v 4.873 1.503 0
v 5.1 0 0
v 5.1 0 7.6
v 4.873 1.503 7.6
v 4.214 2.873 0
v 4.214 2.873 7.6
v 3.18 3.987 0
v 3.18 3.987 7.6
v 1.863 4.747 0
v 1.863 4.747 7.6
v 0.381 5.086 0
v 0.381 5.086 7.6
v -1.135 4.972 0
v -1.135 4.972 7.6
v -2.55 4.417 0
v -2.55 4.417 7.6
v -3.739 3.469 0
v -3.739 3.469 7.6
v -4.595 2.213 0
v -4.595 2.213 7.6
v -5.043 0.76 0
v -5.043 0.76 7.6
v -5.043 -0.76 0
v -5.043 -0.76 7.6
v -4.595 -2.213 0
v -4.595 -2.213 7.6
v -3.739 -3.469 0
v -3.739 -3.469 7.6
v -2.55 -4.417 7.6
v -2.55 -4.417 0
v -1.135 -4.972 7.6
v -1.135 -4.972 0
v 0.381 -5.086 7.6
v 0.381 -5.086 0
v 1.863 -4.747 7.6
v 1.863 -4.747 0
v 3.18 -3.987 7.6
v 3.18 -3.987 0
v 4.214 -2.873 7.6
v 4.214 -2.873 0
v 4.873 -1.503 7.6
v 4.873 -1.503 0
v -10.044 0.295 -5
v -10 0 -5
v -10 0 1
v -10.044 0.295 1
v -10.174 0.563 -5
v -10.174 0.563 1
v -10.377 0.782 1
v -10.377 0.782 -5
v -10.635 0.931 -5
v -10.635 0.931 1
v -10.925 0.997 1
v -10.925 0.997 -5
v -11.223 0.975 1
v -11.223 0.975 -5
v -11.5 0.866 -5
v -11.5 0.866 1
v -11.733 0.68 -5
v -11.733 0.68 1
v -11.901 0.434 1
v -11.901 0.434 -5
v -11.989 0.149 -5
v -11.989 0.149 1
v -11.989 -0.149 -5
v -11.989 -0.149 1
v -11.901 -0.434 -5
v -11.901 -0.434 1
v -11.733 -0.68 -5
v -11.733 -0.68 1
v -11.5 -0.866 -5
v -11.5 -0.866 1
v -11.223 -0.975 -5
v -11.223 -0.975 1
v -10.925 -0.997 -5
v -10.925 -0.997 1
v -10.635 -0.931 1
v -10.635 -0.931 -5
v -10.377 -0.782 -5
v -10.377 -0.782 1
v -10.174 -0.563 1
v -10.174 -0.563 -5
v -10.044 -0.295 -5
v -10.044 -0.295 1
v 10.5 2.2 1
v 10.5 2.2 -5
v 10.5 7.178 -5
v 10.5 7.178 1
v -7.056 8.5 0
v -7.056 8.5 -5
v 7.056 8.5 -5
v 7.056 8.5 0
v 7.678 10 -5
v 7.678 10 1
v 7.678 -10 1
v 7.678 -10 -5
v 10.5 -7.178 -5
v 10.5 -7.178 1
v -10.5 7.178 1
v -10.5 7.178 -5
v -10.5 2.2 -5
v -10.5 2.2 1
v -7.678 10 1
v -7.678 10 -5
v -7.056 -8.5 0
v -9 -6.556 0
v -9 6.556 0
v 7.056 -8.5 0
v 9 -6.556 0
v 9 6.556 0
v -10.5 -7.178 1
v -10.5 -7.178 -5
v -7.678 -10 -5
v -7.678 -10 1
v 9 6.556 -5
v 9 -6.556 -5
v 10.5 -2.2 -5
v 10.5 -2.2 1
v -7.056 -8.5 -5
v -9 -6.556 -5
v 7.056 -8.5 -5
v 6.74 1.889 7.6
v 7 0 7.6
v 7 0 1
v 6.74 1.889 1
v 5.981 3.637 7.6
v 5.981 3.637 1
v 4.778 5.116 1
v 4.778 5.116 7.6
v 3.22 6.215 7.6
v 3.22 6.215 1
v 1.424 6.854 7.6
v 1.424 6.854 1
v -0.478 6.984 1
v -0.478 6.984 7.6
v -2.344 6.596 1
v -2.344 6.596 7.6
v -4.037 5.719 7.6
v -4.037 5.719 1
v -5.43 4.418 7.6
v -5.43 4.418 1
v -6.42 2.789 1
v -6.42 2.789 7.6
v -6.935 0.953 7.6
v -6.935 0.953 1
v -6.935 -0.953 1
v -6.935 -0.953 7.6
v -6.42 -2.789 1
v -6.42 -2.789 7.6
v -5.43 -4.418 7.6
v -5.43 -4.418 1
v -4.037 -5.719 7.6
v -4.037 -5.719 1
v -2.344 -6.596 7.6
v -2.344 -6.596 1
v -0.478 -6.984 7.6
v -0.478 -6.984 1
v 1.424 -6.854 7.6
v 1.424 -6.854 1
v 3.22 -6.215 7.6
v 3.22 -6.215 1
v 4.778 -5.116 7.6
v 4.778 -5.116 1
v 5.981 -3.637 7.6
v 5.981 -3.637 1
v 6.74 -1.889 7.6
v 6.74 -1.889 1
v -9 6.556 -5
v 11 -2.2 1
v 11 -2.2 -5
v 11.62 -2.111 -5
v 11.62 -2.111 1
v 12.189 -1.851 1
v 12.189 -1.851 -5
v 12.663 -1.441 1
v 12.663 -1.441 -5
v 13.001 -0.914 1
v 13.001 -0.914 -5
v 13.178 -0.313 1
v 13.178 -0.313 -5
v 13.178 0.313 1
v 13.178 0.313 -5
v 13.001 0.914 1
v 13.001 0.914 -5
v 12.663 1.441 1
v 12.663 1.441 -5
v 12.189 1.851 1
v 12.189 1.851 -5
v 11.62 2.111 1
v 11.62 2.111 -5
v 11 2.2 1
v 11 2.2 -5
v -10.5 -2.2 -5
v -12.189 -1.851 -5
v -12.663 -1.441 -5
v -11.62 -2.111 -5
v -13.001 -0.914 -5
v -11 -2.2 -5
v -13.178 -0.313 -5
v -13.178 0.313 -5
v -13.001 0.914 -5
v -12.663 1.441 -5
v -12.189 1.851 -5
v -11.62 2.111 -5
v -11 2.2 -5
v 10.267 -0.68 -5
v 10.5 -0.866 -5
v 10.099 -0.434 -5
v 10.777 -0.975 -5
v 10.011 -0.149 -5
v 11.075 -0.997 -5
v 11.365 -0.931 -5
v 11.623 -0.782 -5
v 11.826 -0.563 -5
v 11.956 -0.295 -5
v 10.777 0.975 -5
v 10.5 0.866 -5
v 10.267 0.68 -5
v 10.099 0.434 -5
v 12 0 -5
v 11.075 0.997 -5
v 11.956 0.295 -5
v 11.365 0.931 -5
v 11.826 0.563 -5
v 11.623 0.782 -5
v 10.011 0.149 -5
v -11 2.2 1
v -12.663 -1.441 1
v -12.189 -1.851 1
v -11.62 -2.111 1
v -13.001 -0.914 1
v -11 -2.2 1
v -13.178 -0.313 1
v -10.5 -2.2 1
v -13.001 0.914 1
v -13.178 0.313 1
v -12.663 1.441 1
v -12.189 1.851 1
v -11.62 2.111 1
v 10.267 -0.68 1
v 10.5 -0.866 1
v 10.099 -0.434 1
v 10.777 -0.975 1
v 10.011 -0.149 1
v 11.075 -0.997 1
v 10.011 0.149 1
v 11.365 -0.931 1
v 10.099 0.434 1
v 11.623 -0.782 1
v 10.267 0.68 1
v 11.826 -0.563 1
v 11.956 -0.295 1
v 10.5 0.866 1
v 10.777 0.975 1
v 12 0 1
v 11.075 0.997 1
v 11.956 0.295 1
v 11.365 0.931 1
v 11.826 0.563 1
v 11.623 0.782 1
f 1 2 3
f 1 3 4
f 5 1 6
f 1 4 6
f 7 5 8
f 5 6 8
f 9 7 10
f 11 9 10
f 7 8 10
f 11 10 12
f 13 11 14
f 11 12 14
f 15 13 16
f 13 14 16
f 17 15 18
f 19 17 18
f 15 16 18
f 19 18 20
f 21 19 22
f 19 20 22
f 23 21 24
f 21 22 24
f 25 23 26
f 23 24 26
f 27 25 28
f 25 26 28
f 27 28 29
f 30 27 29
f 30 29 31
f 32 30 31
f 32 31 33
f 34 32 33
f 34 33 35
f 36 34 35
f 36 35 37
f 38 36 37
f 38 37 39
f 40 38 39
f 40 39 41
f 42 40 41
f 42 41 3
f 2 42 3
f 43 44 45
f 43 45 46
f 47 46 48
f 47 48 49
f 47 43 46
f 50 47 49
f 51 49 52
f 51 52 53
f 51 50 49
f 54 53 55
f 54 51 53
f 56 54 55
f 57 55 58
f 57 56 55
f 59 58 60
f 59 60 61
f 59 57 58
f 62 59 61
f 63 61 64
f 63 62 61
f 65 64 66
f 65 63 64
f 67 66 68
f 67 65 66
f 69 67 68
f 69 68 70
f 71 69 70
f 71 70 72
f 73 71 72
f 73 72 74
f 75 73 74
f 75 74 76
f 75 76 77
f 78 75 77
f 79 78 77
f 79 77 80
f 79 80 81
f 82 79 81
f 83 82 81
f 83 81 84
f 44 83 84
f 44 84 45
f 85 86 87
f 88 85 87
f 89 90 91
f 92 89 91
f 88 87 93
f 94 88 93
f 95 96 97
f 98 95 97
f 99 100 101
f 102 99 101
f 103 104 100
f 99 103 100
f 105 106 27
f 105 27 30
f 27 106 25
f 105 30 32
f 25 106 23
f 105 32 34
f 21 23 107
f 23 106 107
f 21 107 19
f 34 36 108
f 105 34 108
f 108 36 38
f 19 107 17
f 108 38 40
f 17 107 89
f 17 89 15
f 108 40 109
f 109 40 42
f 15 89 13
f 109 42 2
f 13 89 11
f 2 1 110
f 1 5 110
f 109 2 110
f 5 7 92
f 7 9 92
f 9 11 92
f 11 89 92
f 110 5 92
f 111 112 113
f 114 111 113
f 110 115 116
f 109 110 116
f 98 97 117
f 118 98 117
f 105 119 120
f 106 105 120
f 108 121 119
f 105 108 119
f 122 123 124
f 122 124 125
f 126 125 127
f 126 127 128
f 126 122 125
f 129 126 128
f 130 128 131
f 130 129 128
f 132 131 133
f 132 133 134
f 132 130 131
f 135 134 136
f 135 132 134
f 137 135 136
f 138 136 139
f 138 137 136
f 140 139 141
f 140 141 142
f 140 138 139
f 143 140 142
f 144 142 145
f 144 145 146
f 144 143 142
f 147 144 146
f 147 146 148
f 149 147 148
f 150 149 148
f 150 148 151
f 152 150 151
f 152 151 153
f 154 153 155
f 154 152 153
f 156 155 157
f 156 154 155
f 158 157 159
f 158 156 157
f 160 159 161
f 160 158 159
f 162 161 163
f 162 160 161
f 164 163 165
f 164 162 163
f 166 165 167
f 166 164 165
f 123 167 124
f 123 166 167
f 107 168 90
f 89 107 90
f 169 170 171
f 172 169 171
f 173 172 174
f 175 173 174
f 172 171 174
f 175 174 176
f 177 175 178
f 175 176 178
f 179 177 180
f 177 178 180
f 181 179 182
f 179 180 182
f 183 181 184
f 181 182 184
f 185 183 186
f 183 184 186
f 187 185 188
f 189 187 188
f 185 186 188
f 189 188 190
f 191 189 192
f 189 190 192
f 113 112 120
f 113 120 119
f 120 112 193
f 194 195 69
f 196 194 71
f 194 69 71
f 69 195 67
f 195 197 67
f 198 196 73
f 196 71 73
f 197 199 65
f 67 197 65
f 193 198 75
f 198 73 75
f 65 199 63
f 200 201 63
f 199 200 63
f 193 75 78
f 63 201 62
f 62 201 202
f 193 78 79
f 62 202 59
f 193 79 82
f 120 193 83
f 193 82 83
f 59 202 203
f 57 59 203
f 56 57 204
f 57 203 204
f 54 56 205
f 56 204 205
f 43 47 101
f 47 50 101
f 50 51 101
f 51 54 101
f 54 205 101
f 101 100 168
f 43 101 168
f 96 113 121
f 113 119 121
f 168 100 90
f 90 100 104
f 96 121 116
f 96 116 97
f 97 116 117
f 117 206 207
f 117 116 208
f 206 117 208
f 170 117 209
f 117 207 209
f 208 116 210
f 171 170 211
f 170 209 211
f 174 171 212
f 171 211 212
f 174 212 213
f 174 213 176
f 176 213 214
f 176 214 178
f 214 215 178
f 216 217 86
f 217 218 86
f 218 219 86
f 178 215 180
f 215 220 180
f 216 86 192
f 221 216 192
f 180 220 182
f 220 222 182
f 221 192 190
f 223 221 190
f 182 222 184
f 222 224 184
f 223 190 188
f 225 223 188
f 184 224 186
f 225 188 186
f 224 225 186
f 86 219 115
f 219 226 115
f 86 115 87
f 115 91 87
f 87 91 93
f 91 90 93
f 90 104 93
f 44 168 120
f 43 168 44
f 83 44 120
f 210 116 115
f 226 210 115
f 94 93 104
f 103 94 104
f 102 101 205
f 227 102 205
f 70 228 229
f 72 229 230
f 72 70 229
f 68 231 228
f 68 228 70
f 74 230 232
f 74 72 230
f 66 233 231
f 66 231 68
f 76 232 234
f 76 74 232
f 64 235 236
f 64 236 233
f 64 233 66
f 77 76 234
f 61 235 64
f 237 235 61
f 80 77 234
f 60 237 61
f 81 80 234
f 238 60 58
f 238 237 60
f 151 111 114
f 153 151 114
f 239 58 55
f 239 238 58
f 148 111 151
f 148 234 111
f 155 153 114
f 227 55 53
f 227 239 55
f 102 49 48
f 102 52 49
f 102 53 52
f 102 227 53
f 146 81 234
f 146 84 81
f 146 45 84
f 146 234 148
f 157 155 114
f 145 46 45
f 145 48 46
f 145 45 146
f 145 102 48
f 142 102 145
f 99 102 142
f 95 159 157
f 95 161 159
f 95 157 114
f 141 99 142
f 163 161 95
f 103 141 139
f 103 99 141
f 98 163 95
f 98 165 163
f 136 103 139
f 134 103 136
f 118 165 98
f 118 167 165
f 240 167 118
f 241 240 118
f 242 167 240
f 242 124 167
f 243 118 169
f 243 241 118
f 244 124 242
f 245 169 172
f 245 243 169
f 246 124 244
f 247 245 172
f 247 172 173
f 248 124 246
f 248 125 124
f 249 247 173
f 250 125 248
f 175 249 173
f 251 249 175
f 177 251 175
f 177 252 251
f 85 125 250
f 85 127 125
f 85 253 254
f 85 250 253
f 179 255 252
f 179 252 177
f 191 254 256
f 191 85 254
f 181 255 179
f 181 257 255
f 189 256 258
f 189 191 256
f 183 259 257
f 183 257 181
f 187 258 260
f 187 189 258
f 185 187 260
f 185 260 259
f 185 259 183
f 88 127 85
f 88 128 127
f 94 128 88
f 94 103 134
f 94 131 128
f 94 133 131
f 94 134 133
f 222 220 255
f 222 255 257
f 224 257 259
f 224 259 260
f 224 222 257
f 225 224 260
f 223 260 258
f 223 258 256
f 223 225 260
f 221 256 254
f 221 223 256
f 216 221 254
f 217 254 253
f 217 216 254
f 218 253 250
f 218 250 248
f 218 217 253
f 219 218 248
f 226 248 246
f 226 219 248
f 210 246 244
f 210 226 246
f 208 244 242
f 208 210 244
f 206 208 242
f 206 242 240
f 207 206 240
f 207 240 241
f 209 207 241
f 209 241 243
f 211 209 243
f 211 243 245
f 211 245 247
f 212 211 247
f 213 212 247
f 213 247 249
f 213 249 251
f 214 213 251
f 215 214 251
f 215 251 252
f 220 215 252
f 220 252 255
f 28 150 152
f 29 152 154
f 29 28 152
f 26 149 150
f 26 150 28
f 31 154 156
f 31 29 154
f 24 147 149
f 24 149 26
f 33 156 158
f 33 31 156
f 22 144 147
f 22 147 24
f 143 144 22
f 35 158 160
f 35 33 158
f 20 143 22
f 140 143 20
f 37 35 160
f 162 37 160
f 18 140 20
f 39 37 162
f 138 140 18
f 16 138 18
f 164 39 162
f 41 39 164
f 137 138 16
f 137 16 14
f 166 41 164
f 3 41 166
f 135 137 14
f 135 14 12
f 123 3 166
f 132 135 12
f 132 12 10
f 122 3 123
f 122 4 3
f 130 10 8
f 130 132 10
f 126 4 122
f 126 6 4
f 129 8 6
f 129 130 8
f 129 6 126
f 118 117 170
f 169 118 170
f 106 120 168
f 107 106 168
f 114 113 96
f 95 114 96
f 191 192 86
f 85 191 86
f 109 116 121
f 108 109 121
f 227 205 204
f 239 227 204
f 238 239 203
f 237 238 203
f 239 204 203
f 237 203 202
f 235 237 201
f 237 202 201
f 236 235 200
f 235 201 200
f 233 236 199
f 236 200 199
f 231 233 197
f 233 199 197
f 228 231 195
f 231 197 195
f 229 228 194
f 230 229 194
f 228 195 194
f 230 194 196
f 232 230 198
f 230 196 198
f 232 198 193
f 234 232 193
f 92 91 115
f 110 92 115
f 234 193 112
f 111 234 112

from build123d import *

# Parameters (mm, degrees)
SKETCH1_R                = 1
ROOF_DEPTH               = 1
WALLS_START              = -5
SKETCH1_3_R              = 1
WALLS_DEPTH              = 5
SKETCH2_R                = 5.1
SCREW_HOLE_IN_ROOF_DEPTH = 18.613631253
SCREW_START              = 6.6
SKETCH2_3_R              = 7
SKETCH2_3_R_2            = 5.1
SCREW_HOLDER_DEPTH       = 6.6


with BuildPart() as part:
    # Sketch1 → Roof (new body)
    with BuildSketch(Plane.XY):
        with BuildLine():
            Line((-7.67766953, 10), (-10.5, 7.17766953))
            Line((-10.5, 7.17766953), (-10.5, 2.2))
            Line((-10.5, 2.2), (-11.000000224, 2.2))
            ThreePointArc((-11.000000224, 2.2), (-13.200000224, 0), (-11.000000224, -2.2))
            Line((-11.000000224, -2.2), (-10.5, -2.2))
            Line((-10.5, -2.2), (-10.5, -7.17766953))
            Line((-10.5, -7.17766953), (-7.67766953, -10))
            Line((-7.67766953, -10), (7.67766953, -10))
            Line((7.67766953, -10), (10.5, -7.17766953))
            Line((10.5, -7.17766953), (10.5, -2.2))
            Line((10.5, -2.2), (11, -2.2))
            ThreePointArc((11, -2.2), (13.2, 0), (11, 2.2))
            Line((11, 2.2), (10.5, 2.2))
            Line((10.5, 2.2), (10.5, 7.17766953))
            Line((10.5, 7.17766953), (7.67766953, 10))
            Line((7.67766953, 10), (-7.67766953, 10))
        make_face()
        with Locations((11, 0)):
            Circle(SKETCH1_R, mode=Mode.SUBTRACT)
        with Locations((-11.000000224, 0)):
            Circle(SKETCH1_R, mode=Mode.SUBTRACT)
    extrude(amount=ROOF_DEPTH)

    # Sketch1<3> → Walls (add)
    with BuildSketch(Plane.XY.offset(WALLS_START)):
        with BuildLine():
            Line((-7.67766953, 10), (-10.5, 7.17766953))
            Line((-10.5, 7.17766953), (-10.5, 2.2))
            Line((-10.5, 2.2), (-11.000000224, 2.2))
            ThreePointArc((-11.000000224, 2.2), (-13.200000224, 0), (-11.000000224, -2.2))
            Line((-11.000000224, -2.2), (-10.5, -2.2))
            Line((-10.5, -2.2), (-10.5, -7.17766953))
            Line((-10.5, -7.17766953), (-7.67766953, -10))
            Line((-7.67766953, -10), (7.67766953, -10))
            Line((7.67766953, -10), (10.5, -7.17766953))
            Line((10.5, -7.17766953), (10.5, -2.2))
            Line((10.5, -2.2), (11, -2.2))
            ThreePointArc((11, -2.2), (13.2, 0), (11, 2.2))
            Line((11, 2.2), (10.5, 2.2))
            Line((10.5, 2.2), (10.5, 7.17766953))
            Line((10.5, 7.17766953), (7.67766953, 10))
            Line((7.67766953, 10), (-7.67766953, 10))
        make_face()
        with Locations((11, 0)):
            Circle(SKETCH1_3_R, mode=Mode.SUBTRACT)
        with Locations((-11.000000224, 0)):
            Circle(SKETCH1_3_R, mode=Mode.SUBTRACT)
        Polygon((-9, -6.556349186), (-9, 6.556349186), (-7.056349186, 8.5), (7.056349186, 8.5), (9, 6.556349186), (9, -6.556349186), (7.056349186, -8.5), (-7.056349186, -8.5), align=None, mode=Mode.SUBTRACT)
    extrude(amount=WALLS_DEPTH)

    # Sketch2 → Screw hole in roof (cut, through all)
    with BuildSketch(Plane.XY.offset(1)):
        Circle(SKETCH2_R)
    extrude(amount=-SCREW_HOLE_IN_ROOF_DEPTH, mode=Mode.SUBTRACT)

    # Sketch2<3> → Screw holder (add)
    with BuildSketch(Plane.XY.offset(1).offset(SCREW_START)):
        Circle(SKETCH2_3_R)
        Circle(SKETCH2_3_R_2, mode=Mode.SUBTRACT)
    extrude(amount=-SCREW_HOLDER_DEPTH)


solid = part.part
